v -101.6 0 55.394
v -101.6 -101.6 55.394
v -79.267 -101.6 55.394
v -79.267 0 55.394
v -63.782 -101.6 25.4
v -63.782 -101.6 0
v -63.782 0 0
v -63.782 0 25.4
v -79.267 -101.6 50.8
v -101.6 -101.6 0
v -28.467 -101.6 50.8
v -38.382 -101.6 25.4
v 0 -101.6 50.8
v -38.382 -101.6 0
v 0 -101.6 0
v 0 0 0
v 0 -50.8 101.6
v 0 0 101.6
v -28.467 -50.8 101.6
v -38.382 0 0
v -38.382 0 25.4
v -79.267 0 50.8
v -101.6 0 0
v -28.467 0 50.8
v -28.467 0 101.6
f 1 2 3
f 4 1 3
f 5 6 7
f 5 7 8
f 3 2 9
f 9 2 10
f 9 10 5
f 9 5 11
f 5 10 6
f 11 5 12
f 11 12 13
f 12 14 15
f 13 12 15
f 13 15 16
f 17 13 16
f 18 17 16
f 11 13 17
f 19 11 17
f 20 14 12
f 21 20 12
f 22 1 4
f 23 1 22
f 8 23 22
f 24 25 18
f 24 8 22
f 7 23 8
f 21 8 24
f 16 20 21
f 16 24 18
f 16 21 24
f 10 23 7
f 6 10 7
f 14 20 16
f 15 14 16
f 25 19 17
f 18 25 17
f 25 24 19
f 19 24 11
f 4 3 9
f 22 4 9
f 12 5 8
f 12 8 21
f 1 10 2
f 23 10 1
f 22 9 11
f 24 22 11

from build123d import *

# Parameters (mm, degrees)
F0_W     = 101.6
F0_H     = 101.6
F1_DEPTH = 101.6
F2_W     = 25.4
F2_H     = 25.4
F3_DEPTH = 232.918
F4_W     = 22.3325428724
F4_H     = 46.2064941585
F5_DEPTH = 115.824
F7_DEPTH = 154.94
F9_DEPTH = 54.356


with BuildPart() as f1:
    # F0 (on Top) → F1 (new body)
    with BuildSketch(Plane.XY):
        with Locations((-50.8, -50.8)):
            Rectangle(F0_W, F0_H)
    extrude(amount=F1_DEPTH)

    # F2 (on face) → F3 (cut)
    with BuildSketch(Plane.XZ.offset(101.6)):
        with Locations((-51.0816488743, 12.7)):
            Rectangle(F2_W, F2_H)
    extrude(amount=-F3_DEPTH, mode=Mode.SUBTRACT)

    # F4 (on face) → F5 (cut)
    with BuildSketch(Plane.XZ.offset(101.6)):
        with Locations((-90.4337285638, 78.4967529207)):
            Rectangle(F4_W, F4_H)
    extrude(amount=-F5_DEPTH, mode=Mode.SUBTRACT)

    # F6 (on face) → F7 (cut)
    with BuildSketch(Plane.XZ.offset(101.6)):
        Polygon((-28.4674571276, 101.6), (-79.2674571276, 101.6), (-79.2674571276, 55.3935058415), (-79.2674571276, 50.8), (-28.4674571276, 50.8), align=None)
    extrude(amount=-F7_DEPTH, mode=Mode.SUBTRACT)

    # F8 (on face) → F9 (cut)
    with BuildSketch(Plane.YZ):
        Polygon((-101.6, 101.6), (-101.6, 50.8), (-50.8, 101.6), align=None)
    extrude(amount=-F9_DEPTH, mode=Mode.SUBTRACT)


solid = f1.part
